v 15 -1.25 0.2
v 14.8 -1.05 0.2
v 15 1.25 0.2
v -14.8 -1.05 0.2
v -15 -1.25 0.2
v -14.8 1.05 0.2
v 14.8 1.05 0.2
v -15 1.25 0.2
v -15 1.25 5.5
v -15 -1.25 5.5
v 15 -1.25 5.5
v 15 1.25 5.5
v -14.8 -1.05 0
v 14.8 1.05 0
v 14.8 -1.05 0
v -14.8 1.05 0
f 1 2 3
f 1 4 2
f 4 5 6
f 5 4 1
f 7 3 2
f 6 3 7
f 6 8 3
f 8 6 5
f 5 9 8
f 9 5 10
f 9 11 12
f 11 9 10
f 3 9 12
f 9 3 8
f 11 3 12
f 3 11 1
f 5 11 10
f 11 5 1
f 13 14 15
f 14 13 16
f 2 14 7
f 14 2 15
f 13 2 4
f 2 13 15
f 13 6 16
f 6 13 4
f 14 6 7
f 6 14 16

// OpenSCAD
front_leg_tilt = 3;
back_leg_tilt = 12;
leg_height = 12;
foot_height = 2;
foot_bottom = 2;
leg_width = [2.5, 2.5];
foot_width = [3.5, 3.5];
block_distance = 3;
rail_width = 1.5;
rail_distance = 16.9;
block_size = [30,2.5,5.5];
joint_size = 4.5;
indent = 1;

bevel = 0.2;

BIAS = 0.01;
INV = 100;
TOL = 0.15;

X_AXIS = [1, 0, 0];
Y_AXIS = [0, 1, 0];

buffer();



!block();
*union() {
    intersection() {
        a_frame();
        translate([INV/2,0,0]) cube(INV, true);
    }
    for(y=[-front_leg_tilt-3, back_leg_tilt+1.5]) translate([0,y,-1.7]) {
        cube([leg_width[0]/3,4,.41]);
    }
}

module buffer() {
    for(x=[-rail_distance / 2, rail_distance / 2]) translate([x,0,0]) {
      a_frame();
    }
    translate([0,-4,leg_height]) block();
}

module block() {
    translate([0,0,bevel]) linear_extrude(block_size[2] -bevel) block_2d();
    linear_extrude(block_size[2] -bevel) offset(-bevel) block_2d();
}

module block_2d() {
    difference() {
        square([block_size[0], block_size[1]], true);
        *for(x=[-rail_distance / 2, rail_distance / 2]) translate([x,block_size[1]/2,0]) {
            square([leg_width[0] + 2*TOL, 1], true);
        }
    }
}

module a_frame() {
    leg(front_leg_tilt);
    leg(-back_leg_tilt);
    translate([0,0, leg_height]) {
        joint();
    }
}

module joint() {
    front_leg_angle = atan(front_leg_tilt / leg_height);
    back_leg_angle = atan(back_leg_tilt / leg_height);
    
    rotate(-90, Y_AXIS)linear_extrude(foot_width[0], center = true) {
        intersection() {
            hull() {
                rotate(front_leg_angle) translate([-joint_size / 2, 0]) {
                    square([joint_size, foot_width[1]], true);
                }
                rotate(-back_leg_angle) {
                    square([2 * joint_size, foot_width[1]], true);
                }
            }
            translate([3.3,-3]) {
                rotate(90) square(INV);
            }
        }
    }
}

module leg(tilt) {
    angle = atan(tilt / (leg_height - foot_height));
    leg_length = sqrt(pow(tilt, 2) + pow((leg_height - foot_height), 2));
    foot_length = (foot_height + foot_bottom) / cos(angle);
 
    translate([0, -tilt, foot_height]) {
        difference() {
            rotate(-angle, X_AXIS) {
                translate([0,0,leg_length/2]) {
                    cube([leg_width[0], leg_width[1] - 2*indent, leg_length + 2*BIAS], true);
                    copy_mirror() translate([leg_width[0] / 3, 0]) {
                        cube([leg_width[0] / 3, leg_width[1], leg_length + 2*BIAS], true);
                    }
                }
                intersection() {
                    translate([0, 0, -foot_length / 2]) {
                        cube(concat(foot_width, foot_length), true);
                    }
                    rotate(angle, X_AXIS) {
                        translate([0, 0, -foot_height - foot_bottom]) {
                            translate([0, 0, INV / 2]) cube(INV, true);
                        }
                    }
                }
            }
            translate([0,0, -foot_bottom-foot_height]) {
                cube([rail_width, leg_width[1] + abs(tilt*2) + BIAS, foot_bottom * 2] , true);
            }
        }
    }
}

module copy_mirror(vec = undef) {
    children();
    mirror(vec) children();
}

//function vec_cat()
